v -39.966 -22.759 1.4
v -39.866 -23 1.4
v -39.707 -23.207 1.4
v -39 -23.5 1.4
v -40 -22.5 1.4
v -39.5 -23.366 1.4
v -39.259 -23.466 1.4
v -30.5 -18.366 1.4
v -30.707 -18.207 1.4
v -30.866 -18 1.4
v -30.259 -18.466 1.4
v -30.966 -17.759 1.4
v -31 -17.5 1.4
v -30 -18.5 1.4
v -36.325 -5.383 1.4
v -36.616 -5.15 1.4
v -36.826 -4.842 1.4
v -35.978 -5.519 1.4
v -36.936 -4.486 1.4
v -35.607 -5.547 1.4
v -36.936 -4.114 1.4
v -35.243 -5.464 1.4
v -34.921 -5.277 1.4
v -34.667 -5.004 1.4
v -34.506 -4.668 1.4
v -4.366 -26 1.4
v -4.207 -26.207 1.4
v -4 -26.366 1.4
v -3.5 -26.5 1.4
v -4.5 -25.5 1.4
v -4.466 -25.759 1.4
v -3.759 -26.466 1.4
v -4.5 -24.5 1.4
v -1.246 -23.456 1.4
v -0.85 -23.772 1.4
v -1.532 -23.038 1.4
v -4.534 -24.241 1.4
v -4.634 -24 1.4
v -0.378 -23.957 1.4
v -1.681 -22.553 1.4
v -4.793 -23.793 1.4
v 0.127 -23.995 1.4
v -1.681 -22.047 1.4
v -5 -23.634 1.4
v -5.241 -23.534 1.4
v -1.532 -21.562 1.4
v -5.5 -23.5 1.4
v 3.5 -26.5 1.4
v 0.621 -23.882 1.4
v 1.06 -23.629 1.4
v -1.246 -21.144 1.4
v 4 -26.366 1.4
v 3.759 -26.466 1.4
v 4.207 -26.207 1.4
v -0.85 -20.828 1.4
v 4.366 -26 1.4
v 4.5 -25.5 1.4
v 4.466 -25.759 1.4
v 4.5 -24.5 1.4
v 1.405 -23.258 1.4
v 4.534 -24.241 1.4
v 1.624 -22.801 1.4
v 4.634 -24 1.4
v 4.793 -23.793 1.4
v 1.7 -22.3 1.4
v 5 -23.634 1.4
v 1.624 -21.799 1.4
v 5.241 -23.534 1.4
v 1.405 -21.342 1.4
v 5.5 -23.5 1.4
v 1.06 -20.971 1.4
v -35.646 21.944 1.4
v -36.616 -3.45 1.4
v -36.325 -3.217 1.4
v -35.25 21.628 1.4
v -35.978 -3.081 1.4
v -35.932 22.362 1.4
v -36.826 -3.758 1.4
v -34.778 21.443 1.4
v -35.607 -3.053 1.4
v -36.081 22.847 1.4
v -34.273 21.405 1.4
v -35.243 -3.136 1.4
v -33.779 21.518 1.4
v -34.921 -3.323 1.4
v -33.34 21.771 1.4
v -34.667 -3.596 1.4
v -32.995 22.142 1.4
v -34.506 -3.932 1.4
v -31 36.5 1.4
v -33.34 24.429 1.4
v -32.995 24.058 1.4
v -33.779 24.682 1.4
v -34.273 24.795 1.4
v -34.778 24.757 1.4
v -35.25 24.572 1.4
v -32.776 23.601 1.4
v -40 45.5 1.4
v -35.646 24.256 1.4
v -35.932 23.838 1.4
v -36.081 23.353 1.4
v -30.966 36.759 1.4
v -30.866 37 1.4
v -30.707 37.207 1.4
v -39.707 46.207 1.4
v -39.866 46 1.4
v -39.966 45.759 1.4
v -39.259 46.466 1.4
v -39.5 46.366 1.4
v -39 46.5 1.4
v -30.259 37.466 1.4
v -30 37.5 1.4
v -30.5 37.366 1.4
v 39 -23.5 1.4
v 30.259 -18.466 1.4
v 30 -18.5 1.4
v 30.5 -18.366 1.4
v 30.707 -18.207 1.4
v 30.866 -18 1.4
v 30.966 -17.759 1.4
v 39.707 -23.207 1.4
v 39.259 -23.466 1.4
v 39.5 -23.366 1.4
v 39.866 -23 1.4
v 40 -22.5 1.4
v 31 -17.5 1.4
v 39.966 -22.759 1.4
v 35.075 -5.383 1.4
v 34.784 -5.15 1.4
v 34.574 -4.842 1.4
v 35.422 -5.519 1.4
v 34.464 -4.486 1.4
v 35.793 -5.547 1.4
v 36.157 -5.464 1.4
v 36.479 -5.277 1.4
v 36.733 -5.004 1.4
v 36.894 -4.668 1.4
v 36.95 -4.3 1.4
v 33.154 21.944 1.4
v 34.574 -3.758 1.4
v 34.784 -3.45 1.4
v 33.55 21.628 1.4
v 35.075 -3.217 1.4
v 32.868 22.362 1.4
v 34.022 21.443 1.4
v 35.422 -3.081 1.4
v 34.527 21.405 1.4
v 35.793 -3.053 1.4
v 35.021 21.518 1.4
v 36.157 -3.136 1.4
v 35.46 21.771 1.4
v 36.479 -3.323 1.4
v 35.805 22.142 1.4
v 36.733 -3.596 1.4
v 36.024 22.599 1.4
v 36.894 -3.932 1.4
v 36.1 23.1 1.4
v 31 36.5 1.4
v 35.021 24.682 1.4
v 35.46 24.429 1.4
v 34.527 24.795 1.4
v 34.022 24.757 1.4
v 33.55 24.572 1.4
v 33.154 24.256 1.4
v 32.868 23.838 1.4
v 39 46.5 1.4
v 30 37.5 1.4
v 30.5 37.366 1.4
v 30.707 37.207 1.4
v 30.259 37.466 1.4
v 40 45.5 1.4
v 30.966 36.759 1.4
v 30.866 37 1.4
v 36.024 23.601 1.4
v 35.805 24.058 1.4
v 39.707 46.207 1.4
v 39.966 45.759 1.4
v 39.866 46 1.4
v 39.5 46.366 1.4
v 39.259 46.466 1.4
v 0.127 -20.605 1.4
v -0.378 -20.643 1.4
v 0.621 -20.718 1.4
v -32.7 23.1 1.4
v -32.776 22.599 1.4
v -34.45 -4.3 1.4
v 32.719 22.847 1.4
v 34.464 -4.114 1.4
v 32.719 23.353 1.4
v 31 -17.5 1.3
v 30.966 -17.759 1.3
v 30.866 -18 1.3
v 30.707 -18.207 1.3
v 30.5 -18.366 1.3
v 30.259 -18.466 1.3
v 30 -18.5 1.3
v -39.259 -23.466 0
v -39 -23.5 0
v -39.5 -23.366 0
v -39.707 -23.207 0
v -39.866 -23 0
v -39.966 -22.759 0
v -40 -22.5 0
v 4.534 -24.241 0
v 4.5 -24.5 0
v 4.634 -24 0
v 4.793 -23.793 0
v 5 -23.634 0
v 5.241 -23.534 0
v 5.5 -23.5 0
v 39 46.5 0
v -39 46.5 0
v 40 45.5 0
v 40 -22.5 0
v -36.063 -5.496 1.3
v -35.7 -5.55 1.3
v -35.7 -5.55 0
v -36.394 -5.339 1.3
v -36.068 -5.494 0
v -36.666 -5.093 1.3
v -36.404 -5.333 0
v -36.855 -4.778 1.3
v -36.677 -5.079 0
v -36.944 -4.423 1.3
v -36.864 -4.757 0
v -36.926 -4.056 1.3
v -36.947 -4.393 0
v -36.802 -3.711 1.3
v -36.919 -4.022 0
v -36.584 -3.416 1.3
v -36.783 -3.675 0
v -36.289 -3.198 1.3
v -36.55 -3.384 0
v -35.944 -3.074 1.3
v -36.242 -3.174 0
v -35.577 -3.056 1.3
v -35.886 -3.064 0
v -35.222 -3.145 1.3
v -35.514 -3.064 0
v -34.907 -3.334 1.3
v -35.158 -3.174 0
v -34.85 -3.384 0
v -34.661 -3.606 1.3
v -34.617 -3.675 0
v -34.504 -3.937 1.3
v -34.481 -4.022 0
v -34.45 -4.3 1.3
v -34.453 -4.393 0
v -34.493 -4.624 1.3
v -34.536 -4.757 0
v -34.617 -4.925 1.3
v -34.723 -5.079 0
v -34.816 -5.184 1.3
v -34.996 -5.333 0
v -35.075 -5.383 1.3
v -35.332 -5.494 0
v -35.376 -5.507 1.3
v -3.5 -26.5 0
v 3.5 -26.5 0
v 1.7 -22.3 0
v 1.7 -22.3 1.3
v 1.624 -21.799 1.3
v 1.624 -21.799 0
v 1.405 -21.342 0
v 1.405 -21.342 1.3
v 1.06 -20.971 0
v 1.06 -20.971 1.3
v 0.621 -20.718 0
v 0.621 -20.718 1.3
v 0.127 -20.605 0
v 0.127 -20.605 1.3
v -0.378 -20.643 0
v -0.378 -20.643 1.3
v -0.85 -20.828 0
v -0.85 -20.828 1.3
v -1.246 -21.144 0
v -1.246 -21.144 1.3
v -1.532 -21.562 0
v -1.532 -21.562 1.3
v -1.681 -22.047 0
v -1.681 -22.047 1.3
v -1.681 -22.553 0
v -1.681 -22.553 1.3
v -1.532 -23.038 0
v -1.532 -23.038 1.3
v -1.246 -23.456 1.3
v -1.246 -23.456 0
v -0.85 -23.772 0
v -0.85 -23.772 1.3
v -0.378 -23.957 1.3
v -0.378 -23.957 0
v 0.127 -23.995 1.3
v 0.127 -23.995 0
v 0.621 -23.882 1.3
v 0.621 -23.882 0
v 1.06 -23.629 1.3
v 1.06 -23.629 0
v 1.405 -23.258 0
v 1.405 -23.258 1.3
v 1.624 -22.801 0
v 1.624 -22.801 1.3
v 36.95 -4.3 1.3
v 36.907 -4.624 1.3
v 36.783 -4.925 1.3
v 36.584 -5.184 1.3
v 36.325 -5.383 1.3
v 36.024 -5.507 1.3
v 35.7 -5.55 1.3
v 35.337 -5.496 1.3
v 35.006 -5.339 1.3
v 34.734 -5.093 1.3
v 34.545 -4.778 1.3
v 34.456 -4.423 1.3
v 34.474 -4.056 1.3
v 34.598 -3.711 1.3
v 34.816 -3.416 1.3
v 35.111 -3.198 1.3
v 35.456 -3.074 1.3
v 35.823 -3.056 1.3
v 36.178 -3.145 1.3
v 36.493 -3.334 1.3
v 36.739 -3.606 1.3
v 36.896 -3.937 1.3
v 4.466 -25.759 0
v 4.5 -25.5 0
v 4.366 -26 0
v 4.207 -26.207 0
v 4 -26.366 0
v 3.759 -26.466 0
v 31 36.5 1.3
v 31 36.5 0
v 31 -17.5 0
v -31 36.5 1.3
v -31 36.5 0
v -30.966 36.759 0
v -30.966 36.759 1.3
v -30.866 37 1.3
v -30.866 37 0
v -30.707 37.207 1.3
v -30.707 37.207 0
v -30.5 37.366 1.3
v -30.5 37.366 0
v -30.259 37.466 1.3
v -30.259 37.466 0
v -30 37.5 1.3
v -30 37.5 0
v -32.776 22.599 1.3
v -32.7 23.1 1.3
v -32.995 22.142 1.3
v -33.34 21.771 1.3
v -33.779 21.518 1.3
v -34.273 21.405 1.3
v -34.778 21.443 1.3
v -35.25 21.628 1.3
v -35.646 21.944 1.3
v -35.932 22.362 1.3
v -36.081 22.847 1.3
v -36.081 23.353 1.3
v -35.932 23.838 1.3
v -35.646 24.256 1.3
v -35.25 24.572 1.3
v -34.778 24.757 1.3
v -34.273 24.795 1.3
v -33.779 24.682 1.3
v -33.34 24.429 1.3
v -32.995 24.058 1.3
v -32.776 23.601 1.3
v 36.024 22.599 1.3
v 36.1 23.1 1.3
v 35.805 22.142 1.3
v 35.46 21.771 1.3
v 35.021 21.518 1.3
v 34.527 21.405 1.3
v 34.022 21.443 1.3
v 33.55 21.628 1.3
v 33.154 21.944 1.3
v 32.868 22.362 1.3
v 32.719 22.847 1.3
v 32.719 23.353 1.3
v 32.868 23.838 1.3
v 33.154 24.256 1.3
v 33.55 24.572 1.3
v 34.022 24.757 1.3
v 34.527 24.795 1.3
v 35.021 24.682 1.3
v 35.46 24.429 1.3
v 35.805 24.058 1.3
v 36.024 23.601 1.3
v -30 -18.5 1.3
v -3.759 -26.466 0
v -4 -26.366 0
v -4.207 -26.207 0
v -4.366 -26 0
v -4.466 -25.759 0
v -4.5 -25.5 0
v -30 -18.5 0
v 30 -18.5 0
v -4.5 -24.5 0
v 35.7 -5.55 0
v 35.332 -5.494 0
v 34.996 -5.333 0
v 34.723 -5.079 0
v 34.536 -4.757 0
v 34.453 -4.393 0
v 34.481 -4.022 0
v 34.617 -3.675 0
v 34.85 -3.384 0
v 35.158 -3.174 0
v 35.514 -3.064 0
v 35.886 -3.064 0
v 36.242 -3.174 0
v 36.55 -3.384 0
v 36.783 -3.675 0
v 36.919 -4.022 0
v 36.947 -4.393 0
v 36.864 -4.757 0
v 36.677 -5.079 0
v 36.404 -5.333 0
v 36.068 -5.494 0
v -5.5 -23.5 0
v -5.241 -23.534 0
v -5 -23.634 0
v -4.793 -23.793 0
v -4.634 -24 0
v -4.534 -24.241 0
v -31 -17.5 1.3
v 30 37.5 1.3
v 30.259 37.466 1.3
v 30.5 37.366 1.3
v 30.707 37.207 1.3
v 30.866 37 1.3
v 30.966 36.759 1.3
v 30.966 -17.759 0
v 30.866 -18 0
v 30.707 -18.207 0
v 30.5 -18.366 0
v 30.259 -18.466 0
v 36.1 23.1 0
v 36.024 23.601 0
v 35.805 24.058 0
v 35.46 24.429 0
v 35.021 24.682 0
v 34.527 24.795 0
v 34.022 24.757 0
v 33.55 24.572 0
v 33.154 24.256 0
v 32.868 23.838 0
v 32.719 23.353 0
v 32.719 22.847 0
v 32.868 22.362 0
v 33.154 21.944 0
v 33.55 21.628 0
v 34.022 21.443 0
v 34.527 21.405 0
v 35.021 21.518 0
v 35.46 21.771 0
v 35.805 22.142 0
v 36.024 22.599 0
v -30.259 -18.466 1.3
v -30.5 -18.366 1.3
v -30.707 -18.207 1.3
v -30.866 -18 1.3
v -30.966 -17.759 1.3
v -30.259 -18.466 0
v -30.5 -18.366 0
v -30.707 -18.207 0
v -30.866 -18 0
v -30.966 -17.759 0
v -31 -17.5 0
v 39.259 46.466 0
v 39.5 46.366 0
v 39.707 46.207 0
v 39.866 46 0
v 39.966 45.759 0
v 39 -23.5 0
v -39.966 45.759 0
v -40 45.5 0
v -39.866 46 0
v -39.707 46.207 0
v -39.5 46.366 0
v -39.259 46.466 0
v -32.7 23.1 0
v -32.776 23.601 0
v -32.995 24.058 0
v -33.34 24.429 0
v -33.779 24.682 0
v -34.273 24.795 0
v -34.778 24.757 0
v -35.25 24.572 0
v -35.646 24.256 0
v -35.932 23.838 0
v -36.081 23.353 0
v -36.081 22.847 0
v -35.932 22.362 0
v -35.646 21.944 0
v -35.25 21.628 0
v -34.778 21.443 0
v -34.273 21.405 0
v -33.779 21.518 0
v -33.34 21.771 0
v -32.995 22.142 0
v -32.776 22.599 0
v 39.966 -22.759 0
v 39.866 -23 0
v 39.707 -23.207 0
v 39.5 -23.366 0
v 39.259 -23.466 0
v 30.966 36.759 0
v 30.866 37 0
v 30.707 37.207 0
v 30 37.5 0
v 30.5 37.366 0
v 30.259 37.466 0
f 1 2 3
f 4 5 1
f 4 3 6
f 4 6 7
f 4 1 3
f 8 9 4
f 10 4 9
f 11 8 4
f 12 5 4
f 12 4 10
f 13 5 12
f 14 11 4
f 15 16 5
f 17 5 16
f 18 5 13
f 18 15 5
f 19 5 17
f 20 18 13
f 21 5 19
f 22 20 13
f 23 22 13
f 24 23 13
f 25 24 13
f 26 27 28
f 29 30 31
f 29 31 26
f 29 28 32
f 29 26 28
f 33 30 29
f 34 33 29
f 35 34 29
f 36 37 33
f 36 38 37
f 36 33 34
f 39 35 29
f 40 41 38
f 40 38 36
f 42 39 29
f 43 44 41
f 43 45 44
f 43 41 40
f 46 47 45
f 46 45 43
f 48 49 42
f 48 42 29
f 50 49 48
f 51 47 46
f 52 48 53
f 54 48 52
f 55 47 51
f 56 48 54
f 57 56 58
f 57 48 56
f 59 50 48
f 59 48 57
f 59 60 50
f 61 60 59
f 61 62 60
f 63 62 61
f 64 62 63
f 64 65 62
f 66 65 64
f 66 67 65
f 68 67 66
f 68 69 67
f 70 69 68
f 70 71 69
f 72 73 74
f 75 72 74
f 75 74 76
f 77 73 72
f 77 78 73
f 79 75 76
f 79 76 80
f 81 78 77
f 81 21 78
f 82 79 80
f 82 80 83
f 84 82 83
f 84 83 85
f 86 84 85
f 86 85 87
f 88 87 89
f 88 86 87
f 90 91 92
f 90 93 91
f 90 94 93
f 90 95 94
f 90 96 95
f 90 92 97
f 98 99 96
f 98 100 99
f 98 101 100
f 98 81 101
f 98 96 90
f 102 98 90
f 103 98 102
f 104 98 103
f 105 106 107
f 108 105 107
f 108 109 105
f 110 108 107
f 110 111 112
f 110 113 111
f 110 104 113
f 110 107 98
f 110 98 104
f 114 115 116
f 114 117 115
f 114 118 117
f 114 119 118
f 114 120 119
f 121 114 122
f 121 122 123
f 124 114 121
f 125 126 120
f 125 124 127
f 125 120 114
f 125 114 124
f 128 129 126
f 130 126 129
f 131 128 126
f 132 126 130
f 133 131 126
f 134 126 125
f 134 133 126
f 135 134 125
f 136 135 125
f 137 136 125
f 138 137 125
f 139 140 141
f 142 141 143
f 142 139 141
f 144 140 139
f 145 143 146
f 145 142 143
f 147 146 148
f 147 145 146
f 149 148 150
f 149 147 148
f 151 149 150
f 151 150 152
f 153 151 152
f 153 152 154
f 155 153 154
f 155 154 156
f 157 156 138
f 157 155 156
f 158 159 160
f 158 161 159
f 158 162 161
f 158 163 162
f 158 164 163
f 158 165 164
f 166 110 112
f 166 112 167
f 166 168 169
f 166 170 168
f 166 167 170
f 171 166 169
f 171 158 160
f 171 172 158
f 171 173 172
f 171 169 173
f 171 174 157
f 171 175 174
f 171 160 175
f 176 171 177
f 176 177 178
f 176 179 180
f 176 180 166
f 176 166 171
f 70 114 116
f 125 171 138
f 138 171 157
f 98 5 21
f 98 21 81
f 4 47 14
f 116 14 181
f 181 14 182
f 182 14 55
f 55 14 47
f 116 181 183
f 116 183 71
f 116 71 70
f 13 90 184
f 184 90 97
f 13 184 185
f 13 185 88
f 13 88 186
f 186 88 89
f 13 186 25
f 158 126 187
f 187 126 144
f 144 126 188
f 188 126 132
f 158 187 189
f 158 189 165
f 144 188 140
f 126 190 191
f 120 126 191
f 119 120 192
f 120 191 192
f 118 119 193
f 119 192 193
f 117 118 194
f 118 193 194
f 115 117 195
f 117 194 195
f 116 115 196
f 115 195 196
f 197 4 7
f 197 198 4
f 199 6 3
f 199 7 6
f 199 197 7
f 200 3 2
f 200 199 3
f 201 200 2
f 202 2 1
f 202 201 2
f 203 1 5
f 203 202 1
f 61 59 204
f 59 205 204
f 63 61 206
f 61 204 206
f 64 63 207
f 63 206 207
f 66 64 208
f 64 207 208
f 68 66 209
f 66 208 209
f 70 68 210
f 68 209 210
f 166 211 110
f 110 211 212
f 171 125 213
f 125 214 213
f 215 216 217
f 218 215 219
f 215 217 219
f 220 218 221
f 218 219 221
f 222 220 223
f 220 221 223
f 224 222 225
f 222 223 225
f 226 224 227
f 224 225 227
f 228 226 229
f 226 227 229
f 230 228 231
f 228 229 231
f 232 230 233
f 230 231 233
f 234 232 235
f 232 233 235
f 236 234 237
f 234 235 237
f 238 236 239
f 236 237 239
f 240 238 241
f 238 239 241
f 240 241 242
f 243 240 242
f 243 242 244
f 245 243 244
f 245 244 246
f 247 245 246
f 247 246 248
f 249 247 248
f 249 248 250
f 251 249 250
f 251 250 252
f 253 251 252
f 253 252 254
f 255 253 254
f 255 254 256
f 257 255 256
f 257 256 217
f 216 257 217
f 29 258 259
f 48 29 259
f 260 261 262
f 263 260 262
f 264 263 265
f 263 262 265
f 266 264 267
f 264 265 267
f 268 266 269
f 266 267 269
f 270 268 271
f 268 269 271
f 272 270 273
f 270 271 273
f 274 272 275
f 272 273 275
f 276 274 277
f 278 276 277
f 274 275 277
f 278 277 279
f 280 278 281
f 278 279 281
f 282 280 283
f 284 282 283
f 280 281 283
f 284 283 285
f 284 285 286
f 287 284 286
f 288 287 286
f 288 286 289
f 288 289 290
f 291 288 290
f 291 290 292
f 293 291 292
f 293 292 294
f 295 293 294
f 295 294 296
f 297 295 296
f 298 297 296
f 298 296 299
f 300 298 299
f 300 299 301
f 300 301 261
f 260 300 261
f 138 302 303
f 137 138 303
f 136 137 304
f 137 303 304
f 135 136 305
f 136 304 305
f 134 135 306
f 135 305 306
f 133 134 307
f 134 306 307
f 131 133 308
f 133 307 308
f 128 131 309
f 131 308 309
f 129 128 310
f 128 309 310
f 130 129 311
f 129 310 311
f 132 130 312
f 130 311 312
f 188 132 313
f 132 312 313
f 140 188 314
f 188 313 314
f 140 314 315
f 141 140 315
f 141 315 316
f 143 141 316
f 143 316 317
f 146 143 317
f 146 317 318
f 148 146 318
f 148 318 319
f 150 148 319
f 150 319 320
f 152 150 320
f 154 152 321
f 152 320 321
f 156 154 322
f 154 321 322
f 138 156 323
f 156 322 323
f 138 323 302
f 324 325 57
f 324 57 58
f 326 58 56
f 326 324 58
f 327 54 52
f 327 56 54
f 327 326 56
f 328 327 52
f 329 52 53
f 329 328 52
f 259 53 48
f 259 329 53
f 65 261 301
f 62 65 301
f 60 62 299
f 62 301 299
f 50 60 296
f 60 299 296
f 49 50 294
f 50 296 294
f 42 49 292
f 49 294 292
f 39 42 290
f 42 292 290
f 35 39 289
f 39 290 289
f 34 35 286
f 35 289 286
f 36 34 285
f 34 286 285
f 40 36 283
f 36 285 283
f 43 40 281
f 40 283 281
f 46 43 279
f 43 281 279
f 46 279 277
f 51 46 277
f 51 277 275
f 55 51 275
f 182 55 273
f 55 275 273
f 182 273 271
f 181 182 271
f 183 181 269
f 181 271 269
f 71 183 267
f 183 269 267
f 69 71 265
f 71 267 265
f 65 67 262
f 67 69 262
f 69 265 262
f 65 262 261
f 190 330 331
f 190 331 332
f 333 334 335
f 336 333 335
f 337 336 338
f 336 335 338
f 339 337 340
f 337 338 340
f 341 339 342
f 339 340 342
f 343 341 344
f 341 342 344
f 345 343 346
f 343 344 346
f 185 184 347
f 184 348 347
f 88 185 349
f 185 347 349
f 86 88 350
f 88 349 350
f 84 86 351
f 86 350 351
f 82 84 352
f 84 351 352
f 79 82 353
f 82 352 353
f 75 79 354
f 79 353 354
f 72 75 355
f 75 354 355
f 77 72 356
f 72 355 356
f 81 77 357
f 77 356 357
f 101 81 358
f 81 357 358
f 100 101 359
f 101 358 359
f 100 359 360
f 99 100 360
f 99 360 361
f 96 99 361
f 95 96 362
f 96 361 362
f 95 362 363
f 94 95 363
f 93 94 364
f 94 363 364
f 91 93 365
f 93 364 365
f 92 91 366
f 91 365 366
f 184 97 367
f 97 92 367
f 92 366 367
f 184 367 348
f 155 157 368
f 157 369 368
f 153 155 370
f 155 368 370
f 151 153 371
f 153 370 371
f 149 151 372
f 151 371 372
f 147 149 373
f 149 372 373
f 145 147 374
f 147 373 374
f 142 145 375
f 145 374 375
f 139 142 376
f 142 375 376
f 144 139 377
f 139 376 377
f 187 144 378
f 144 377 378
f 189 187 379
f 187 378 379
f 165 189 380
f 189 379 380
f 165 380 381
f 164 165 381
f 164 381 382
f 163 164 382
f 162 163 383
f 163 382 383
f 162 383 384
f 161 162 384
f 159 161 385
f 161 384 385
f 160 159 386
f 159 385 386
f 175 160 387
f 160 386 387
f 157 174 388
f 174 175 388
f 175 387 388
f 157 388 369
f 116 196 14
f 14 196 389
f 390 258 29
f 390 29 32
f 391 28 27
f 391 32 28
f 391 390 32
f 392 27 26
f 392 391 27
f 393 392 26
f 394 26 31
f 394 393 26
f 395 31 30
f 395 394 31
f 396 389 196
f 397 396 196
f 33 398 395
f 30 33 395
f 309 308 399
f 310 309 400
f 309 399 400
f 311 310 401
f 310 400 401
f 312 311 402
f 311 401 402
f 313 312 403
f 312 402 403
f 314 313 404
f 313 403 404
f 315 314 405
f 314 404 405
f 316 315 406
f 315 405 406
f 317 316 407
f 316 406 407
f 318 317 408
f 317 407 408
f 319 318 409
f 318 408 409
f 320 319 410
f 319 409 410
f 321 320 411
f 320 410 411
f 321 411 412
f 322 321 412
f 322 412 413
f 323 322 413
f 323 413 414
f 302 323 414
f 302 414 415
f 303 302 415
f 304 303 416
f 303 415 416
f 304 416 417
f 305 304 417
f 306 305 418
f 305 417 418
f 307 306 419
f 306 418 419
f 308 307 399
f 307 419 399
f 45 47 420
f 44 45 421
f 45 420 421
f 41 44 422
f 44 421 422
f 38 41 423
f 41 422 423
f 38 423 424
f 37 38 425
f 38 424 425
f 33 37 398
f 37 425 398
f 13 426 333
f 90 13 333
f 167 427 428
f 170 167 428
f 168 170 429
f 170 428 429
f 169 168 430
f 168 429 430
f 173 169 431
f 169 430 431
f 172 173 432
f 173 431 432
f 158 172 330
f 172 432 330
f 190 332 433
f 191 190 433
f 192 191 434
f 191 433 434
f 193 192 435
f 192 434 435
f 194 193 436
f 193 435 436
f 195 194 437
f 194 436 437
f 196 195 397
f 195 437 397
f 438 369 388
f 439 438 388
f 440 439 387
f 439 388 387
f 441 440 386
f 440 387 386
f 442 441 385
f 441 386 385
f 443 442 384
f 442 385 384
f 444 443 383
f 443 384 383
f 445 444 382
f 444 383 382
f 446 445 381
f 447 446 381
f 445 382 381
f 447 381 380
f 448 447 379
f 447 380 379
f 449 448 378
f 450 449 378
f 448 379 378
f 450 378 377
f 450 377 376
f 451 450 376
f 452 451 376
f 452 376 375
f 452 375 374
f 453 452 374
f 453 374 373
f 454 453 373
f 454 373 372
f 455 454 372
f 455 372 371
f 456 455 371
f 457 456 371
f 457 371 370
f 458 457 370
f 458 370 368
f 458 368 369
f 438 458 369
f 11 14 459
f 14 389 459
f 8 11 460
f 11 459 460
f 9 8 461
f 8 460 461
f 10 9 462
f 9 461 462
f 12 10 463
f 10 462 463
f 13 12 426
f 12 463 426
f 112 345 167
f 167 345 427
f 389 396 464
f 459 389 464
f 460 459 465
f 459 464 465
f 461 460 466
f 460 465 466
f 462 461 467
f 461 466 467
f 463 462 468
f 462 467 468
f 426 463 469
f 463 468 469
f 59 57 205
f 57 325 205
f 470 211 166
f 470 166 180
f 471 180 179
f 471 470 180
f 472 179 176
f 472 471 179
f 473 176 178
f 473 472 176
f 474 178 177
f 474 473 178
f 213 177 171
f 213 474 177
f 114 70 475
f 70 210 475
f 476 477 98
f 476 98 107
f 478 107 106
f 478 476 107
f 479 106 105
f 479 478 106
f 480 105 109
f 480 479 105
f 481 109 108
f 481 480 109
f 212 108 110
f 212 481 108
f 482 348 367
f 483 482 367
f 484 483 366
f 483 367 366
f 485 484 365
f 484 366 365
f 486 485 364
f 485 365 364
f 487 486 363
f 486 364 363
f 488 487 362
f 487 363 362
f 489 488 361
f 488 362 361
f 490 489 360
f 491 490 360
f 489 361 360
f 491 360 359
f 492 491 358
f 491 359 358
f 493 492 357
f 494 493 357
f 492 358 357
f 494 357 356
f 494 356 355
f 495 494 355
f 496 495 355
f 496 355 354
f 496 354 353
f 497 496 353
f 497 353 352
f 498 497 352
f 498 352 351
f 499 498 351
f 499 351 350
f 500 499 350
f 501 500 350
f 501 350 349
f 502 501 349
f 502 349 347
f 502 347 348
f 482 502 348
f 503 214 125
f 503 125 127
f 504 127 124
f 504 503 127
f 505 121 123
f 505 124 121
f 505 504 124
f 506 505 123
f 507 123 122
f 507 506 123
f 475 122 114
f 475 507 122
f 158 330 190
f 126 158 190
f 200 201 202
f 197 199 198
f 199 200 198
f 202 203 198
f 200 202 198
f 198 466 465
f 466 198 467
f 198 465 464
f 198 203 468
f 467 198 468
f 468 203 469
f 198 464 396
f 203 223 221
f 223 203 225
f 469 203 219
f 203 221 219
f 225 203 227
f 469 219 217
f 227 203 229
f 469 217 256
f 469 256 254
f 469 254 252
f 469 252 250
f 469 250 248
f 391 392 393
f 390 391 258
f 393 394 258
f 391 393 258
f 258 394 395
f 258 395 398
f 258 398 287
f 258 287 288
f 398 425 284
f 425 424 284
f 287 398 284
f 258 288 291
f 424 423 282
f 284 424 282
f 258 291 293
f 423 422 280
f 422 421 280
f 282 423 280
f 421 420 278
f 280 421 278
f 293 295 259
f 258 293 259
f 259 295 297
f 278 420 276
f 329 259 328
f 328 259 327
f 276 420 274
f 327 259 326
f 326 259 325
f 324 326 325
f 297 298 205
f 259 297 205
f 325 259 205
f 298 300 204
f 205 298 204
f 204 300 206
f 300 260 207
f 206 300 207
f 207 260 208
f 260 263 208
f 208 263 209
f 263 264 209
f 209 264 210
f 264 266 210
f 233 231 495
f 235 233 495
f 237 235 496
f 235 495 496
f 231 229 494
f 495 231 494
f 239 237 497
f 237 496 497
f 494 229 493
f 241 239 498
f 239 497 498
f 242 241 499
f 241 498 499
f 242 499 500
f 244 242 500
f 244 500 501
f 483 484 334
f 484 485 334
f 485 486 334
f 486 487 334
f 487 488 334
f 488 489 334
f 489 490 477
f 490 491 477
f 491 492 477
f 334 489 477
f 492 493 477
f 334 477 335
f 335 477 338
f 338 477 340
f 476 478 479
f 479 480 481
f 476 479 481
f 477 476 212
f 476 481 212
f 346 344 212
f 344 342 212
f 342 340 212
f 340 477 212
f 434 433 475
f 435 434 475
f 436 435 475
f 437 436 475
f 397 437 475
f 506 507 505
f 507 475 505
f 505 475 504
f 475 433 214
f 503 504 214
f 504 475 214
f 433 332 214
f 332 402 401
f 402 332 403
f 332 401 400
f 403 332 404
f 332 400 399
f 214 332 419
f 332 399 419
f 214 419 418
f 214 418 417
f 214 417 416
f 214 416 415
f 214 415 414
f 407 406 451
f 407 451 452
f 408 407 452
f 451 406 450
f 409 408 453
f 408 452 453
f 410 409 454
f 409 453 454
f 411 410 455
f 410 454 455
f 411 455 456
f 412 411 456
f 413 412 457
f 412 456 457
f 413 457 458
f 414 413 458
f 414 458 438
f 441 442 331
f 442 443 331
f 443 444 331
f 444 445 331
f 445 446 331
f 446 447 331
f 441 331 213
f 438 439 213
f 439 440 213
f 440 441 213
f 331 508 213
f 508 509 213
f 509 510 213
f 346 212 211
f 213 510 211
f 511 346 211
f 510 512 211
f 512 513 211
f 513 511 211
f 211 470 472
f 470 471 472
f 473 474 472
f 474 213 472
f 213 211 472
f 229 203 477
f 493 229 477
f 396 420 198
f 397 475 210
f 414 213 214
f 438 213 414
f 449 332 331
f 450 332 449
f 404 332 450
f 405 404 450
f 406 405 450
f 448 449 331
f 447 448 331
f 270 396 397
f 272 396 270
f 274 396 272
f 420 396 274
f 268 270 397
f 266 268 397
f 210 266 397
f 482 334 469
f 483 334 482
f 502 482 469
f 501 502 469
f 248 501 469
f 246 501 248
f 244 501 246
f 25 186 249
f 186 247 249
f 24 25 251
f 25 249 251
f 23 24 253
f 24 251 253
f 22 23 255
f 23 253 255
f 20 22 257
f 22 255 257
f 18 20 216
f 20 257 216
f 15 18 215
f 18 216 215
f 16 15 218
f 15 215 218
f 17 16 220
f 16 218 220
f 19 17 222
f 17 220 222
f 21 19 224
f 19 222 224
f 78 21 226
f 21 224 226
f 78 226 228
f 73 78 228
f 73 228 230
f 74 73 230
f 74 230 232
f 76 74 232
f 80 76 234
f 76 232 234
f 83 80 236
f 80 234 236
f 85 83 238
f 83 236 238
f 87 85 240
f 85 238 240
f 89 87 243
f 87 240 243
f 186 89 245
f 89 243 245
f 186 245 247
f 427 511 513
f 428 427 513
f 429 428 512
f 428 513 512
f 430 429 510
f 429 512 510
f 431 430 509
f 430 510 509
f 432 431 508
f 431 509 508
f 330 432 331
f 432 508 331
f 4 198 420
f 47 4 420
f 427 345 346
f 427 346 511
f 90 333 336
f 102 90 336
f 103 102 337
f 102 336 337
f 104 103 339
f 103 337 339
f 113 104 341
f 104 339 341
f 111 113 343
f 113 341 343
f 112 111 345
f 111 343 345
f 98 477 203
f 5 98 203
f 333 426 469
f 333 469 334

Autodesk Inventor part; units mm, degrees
ref_plane "YZ Plane" through (0, 0, 0) normal (1, 0, 0) x (0, 1, 0)
ref_plane "XZ Plane" through (0, 0, 0) normal (0, 1, 0) x (-1, 0, 0)
ref_plane "XY Plane" through (0, 0, 0) normal (0, 0, 1) x (1, 0, 0)
sketch "Sketch1" plane through (0, 0, 0) normal (0, 0, 1) x (1, 0, 0)
  line L0 (-40, 32.5) -> (40, 32.5)
  line L1 (40, 32.5) -> (40, -32.5)
  line L2 (40, -32.5) -> (-40, -32.5)
  line L3 (-40, -32.5) -> (-40, 32.5)
  line L4 (-40, 32.5) -> (40, -32.5) construction
  line L5 (40, 32.5) -> (-40, -32.5) construction
  line L6 (-8, 32.5) -> (-8, 24.5)
  line L7 (-8, 24.5) -> (-20, 24.5)
  line L8 (-20, 24.5) -> (-20, 28.5)
  line L9 (-20, 28.5) -> (-40, 28.5)
  line L10 (-40, -27) -> (-19, -27)
  line L11 (-19, -27) -> (-15.5, -23.5)
  line L12 (-15.5, -23.5) -> (-9.5, -23.5)
  line L13 (-9.5, -23.5) -> (-9.5, -32.5)
  line L14 (9.5, -32.5) -> (9.5, -23.5)
  line L15 (9.5, -23.5) -> (15.5, -23.5)
  line L16 (15.5, -23.5) -> (19, -27)
  line L17 (19, -27) -> (40, -27)
  point P0 (0, 0)
  dimension "d0" = 80
  dimension "d1" = 65
  dimension "d2" = 19
  dimension "d3" = 45
  dimension "d4" = 9
  dimension "d5" = 3.5
  dimension "d6" = 6
  dimension "d7" = 45
  dimension "d8" = 8
  dimension "d9" = 8
  dimension "d10" = 12
  dimension "d11" = 4
extrude "Extrusion1" add sketch "Sketch1" along normal blind 1.3 contours L0 L1 L17 L16 L15 L14 L2 L13 L12 L11 L10 L3 L9 L8 L7 L6
sketch "Sketch2" plane through (0, 0, 1.3) normal (0, 0, 1) x (1, 0, 0)
  line L0 (-35.7, -4.3) -> (35.7, -4.3) construction
  line L1 (-40, -27) -> (-19, -27) projected
  point P0 (0, 0)
  point P1 (0, -4.3)
  dimension "d14" = 71.4
  dimension "d15" = 22.7
hole "Hole1" at (-35.7, -4.3, 1.3) at (35.7, -4.3, 1.3) direction (0, 0, -1) diameter 2.5 end through all
sketch "Sketch4" plane through (-8, 32.5, 0) normal (0, 1, 0) x (1, 0, 0)
  line L0 (10.9, -2.9) -> (5.1, -2.9) construction
  line L1 (10.9, -1.3) -> (5.1, -1.3)
  line L2 (5.1, -4.5) -> (10.9, -4.5)
  arc A0 (10.9, -4.5) -> (10.9, -1.3) centre (10.9, -2.9) ccw
  arc A1 (5.1, -1.3) -> (5.1, -4.5) centre (5.1, -2.9) ccw
  line L3 (48, -1.3) -> (0, -1.3) projected
  line L4 (10.9, -2.9) -> (5.1, -2.9) construction
  line L5 (10.9, -1.7) -> (5.1, -1.7)
  line L6 (5.1, -4.1) -> (10.9, -4.1)
  arc A2 (10.9, -4.1) -> (10.9, -1.7) centre (10.9, -2.9) ccw
  arc A3 (5.1, -1.7) -> (5.1, -4.1) centre (5.1, -2.9) ccw
  point P0 (8, 0)
  point P1 (8, -2.9)
  point P2 (3.5, -2.9)
  point P3 (12.5, -2.9)
  point P4 (8, -2.9)
  dimension "d23" = 3.2
  dimension "d24" = 9
  dimension "d25" = 0.4
extrude "Extrusion2" add sketch "Sketch4" against normal blind 6.8
sketch "Sketch5" plane through (0, 0, 1.3) normal (0, 0, 1) x (1, 0, 0)
  circle A0 centre (-34.4, 23.1) radius 1.7
  circle A1 centre (34.4, 23.1) radius 1.7
  circle A2 centre (0, -22.3) radius 1.7
  line L0 (-34.4, 23.1) -> (34.4, 23.1) construction
  circle A3 centre (35.7, -4.3) radius 1.25 projected
  point P0 (0, 0)
  point P1 (0, 23.1)
  dimension "d28" = 3.4
  dimension "d29" = 68.8
  dimension "d30" = 27.4
  dimension "d31" = 18
extrude "Extrusion3" add sketch "Sketch5" along normal blind 0.4 contours A0 | A1 | A2
sketch "Sketch6" plane through (0, -22.3, 1.7) normal (0, 0, 1) x (1, 0, 0)
  circle A0 centre (0, 0) radius 1.7 projected
  circle A1 centre (-34.4, 45.4) radius 1.7 projected
  circle A2 centre (34.4, 45.4) radius 1.7 projected
  point P0 (0, 22.3)
extrude "Extrusion4" cut sketch "Sketch6" against normal through all
sketch "Sketch7" plane through (0, 0, 1.3) normal (0, 0, 1) x (1, 0, 0)
  line L0 (40, 32.5) -> (-8, 32.5) projected
  line L1 (40, 32.5) -> (40, 46.5)
  line L2 (40, 46.5) -> (-40, 46.5)
  line L3 (-40, 28.5) -> (-40, -27) projected
  line L4 (-40, 46.5) -> (-40, 28.5)
  line L5 (-40, 28.5) -> (-31, 28.5)
  line L6 (-20, 28.5) -> (-40, 28.5) projected
  line L7 (-31, 28.5) -> (-31, 37.5)
  line L8 (-31, 37.5) -> (31, 37.5)
  line L9 (31, 37.5) -> (31, 32.5)
  point P0 (0, 0)
  dimension "d36" = 9
  dimension "d37" = 9
  dimension "d38" = 9
  dimension "d39" = 5
extrude "Extrusion5" add sketch "Sketch7" against normal up to surface (1.3 mm away)
sketch "Sketch8" plane through (0, 0, 1.3) normal (0, 0, 1) x (1, 0, 0)
  line L0 (31, 32.5) -> (2.9, 32.5) projected
  line L1 (31, 32.5) -> (-31, 32.5)
  line L2 (-31, 32.5) -> (-31, -18.5)
  line L3 (-31, -18.5) -> (31, -18.5)
  line L4 (31, -18.5) -> (31, 32.5)
  line L5 (-31, 28.5) -> (-31, 37.5) projected
  line L6 (-15.5, -23.5) -> (-9.5, -23.5) projected
  line L7 (-40, -27) -> (-19, -27) projected
  line L8 (-15.5, -23.5) -> (-40, -23.5)
  line L9 (-40, -23.5) -> (-40, -27)
  line L10 (-40, -27) -> (-15.5, -27)
  line L11 (-15.5, -27) -> (-15.5, -23.5)
  line L12 (15.5, -23.5) -> (19, -27) projected
  line L13 (19, -27) -> (40, -27) projected
  line L14 (15.5, -23.5) -> (40, -23.5)
  line L15 (40, -23.5) -> (40, -27)
  line L16 (40, -27) -> (15.5, -27)
  line L17 (15.5, -27) -> (15.5, -23.5)
  line L18 (9.5, -32.5) -> (9.5, -23.5) projected
  line L19 (-9.5, -32.5) -> (9.5, -32.5) projected
  line L20 (9.5, -26.5) -> (-9.5, -26.5)
  line L21 (-9.5, -26.5) -> (-9.5, -32.5)
  line L22 (-9.5, -32.5) -> (9.5, -32.5)
  line L23 (9.5, -32.5) -> (9.5, -26.5)
  line L24 (-9.5, -23.5) -> (-9.5, -32.5) projected
  line L25 (-9.5, -23.5) -> (-4.5, -23.5)
  line L26 (-4.5, -23.5) -> (-4.5, -26.5)
  line L27 (-4.5, -26.5) -> (-9.5, -26.5)
  line L28 (-9.5, -26.5) -> (-9.5, -23.5)
  line L29 (9.5, -23.5) -> (15.5, -23.5) projected
  line L30 (9.5, -23.5) -> (4.5, -23.5)
  line L31 (4.5, -23.5) -> (4.5, -26.5)
  line L32 (4.5, -26.5) -> (9.5, -26.5)
  line L33 (9.5, -26.5) -> (9.5, -23.5)
  point P0 (0, 0)
  point P1 (-19, -27)
  point P2 (2.9, 32.5)
  dimension "d42" = 51
  dimension "d43" = 8
  dimension "d44" = 5
  dimension "d45" = 5
extrude "Extrusion6" cut sketch "Sketch8" against normal through all
sketch "Sketch9" plane through (-2.9, 32.5, 4.5) normal (0, 0, 1) x (1, 0, 0)
  line L0 (-5.3856, 3.3152) -> (10.2234, 3.3152)
  line L1 (10.2234, 3.3152) -> (10.2234, -11.8662)
  line L2 (10.2234, -11.8662) -> (-5.3856, -11.8662)
  line L3 (-5.3856, -11.8662) -> (-5.3856, 3.3152)
  point P0 (2.9, -32.5)
extrude "Extrusion7" cut sketch "Sketch9" against normal through all
fillet "Fillet1" radius 1 12 edges at (-31, 37.5, 0.65) (-40, 46.5, 0.65) (31, 37.5, 0.65) (40, 46.5, 0.65) (40, -23.5, 0.65) (31, -18.5, 0.65) (4.5, -23.5, 0.65) (4.5, -26.5, 0.65) (-4.5, -26.5, 0.65) (-4.5, -23.5, 0.65) (-31, -18.5, 0.65) (-40, -23.5, 0.65)
sketch "Sketch10" plane through (0, 0, 1.3) normal (0, 0, 1) x (1, 0, 0)
  line L0 (39, 46.5) -> (-39, 46.5) projected
  circle A0 centre (-35.7, -4.3) radius 1.25 projected
  circle A1 centre (35.7, -4.3) radius 1.25 projected
  line L1 (31, 36.5) -> (31, -17.5) projected
  arc A2 (30, -18.5) -> (31, -17.5) centre (30, -17.5) ccw projected
  line L2 (30, -18.5) -> (-30, -18.5) projected
  arc A3 (-31, -17.5) -> (-30, -18.5) centre (-30, -17.5) ccw projected
  line L3 (-31, -17.5) -> (-31, 36.5) projected
  arc A4 (-30, 37.5) -> (-31, 36.5) centre (-30, 36.5) ccw projected
  line L4 (-30, 37.5) -> (30, 37.5) projected
  arc A5 (31, 36.5) -> (30, 37.5) centre (30, 36.5) ccw projected
  circle A6 centre (0, -22.3) radius 1.7 projected
  circle A7 centre (34.4, 23.1) radius 1.7 projected
  circle A8 centre (-34.4, 23.1) radius 1.7 projected
  arc A9 (-40, -22.5) -> (-39, -23.5) centre (-39, -22.5) ccw projected
  line L5 (-39, -23.5) -> (-5.5, -23.5) projected
  arc A10 (-4.5, -24.5) -> (-5.5, -23.5) centre (-5.5, -24.5) ccw projected
  line L6 (-4.5, -24.5) -> (-4.5, -25.5) projected
  arc A11 (-4.5, -25.5) -> (-3.5, -26.5) centre (-3.5, -25.5) ccw projected
  line L7 (-3.5, -26.5) -> (3.5, -26.5) projected
  arc A12 (3.5, -26.5) -> (4.5, -25.5) centre (3.5, -25.5) ccw projected
  line L8 (4.5, -25.5) -> (4.5, -24.5) projected
  arc A13 (5.5, -23.5) -> (4.5, -24.5) centre (5.5, -24.5) ccw projected
  line L9 (5.5, -23.5) -> (39, -23.5) projected
  arc A14 (39, -23.5) -> (40, -22.5) centre (39, -22.5) ccw projected
  line L10 (40, -22.5) -> (40, 45.5) projected
  arc A15 (40, 45.5) -> (39, 46.5) centre (39, 45.5) ccw projected
  line L11 (39, 46.5) -> (-39, 46.5) projected
  arc A16 (-39, 46.5) -> (-40, 45.5) centre (-39, 45.5) ccw projected
  line L12 (-40, 45.5) -> (-40, -22.5) projected
  point P0 (0, 0)
extrude "Extrusion8" add sketch "Sketch10" along normal blind 0.1
equation "\"d7\" = d3"
equation "\"d37\" = d36"
equation "\"d38\" = d36"
equation "\"d45\" = d44"
properties part number "PlacementTest"
